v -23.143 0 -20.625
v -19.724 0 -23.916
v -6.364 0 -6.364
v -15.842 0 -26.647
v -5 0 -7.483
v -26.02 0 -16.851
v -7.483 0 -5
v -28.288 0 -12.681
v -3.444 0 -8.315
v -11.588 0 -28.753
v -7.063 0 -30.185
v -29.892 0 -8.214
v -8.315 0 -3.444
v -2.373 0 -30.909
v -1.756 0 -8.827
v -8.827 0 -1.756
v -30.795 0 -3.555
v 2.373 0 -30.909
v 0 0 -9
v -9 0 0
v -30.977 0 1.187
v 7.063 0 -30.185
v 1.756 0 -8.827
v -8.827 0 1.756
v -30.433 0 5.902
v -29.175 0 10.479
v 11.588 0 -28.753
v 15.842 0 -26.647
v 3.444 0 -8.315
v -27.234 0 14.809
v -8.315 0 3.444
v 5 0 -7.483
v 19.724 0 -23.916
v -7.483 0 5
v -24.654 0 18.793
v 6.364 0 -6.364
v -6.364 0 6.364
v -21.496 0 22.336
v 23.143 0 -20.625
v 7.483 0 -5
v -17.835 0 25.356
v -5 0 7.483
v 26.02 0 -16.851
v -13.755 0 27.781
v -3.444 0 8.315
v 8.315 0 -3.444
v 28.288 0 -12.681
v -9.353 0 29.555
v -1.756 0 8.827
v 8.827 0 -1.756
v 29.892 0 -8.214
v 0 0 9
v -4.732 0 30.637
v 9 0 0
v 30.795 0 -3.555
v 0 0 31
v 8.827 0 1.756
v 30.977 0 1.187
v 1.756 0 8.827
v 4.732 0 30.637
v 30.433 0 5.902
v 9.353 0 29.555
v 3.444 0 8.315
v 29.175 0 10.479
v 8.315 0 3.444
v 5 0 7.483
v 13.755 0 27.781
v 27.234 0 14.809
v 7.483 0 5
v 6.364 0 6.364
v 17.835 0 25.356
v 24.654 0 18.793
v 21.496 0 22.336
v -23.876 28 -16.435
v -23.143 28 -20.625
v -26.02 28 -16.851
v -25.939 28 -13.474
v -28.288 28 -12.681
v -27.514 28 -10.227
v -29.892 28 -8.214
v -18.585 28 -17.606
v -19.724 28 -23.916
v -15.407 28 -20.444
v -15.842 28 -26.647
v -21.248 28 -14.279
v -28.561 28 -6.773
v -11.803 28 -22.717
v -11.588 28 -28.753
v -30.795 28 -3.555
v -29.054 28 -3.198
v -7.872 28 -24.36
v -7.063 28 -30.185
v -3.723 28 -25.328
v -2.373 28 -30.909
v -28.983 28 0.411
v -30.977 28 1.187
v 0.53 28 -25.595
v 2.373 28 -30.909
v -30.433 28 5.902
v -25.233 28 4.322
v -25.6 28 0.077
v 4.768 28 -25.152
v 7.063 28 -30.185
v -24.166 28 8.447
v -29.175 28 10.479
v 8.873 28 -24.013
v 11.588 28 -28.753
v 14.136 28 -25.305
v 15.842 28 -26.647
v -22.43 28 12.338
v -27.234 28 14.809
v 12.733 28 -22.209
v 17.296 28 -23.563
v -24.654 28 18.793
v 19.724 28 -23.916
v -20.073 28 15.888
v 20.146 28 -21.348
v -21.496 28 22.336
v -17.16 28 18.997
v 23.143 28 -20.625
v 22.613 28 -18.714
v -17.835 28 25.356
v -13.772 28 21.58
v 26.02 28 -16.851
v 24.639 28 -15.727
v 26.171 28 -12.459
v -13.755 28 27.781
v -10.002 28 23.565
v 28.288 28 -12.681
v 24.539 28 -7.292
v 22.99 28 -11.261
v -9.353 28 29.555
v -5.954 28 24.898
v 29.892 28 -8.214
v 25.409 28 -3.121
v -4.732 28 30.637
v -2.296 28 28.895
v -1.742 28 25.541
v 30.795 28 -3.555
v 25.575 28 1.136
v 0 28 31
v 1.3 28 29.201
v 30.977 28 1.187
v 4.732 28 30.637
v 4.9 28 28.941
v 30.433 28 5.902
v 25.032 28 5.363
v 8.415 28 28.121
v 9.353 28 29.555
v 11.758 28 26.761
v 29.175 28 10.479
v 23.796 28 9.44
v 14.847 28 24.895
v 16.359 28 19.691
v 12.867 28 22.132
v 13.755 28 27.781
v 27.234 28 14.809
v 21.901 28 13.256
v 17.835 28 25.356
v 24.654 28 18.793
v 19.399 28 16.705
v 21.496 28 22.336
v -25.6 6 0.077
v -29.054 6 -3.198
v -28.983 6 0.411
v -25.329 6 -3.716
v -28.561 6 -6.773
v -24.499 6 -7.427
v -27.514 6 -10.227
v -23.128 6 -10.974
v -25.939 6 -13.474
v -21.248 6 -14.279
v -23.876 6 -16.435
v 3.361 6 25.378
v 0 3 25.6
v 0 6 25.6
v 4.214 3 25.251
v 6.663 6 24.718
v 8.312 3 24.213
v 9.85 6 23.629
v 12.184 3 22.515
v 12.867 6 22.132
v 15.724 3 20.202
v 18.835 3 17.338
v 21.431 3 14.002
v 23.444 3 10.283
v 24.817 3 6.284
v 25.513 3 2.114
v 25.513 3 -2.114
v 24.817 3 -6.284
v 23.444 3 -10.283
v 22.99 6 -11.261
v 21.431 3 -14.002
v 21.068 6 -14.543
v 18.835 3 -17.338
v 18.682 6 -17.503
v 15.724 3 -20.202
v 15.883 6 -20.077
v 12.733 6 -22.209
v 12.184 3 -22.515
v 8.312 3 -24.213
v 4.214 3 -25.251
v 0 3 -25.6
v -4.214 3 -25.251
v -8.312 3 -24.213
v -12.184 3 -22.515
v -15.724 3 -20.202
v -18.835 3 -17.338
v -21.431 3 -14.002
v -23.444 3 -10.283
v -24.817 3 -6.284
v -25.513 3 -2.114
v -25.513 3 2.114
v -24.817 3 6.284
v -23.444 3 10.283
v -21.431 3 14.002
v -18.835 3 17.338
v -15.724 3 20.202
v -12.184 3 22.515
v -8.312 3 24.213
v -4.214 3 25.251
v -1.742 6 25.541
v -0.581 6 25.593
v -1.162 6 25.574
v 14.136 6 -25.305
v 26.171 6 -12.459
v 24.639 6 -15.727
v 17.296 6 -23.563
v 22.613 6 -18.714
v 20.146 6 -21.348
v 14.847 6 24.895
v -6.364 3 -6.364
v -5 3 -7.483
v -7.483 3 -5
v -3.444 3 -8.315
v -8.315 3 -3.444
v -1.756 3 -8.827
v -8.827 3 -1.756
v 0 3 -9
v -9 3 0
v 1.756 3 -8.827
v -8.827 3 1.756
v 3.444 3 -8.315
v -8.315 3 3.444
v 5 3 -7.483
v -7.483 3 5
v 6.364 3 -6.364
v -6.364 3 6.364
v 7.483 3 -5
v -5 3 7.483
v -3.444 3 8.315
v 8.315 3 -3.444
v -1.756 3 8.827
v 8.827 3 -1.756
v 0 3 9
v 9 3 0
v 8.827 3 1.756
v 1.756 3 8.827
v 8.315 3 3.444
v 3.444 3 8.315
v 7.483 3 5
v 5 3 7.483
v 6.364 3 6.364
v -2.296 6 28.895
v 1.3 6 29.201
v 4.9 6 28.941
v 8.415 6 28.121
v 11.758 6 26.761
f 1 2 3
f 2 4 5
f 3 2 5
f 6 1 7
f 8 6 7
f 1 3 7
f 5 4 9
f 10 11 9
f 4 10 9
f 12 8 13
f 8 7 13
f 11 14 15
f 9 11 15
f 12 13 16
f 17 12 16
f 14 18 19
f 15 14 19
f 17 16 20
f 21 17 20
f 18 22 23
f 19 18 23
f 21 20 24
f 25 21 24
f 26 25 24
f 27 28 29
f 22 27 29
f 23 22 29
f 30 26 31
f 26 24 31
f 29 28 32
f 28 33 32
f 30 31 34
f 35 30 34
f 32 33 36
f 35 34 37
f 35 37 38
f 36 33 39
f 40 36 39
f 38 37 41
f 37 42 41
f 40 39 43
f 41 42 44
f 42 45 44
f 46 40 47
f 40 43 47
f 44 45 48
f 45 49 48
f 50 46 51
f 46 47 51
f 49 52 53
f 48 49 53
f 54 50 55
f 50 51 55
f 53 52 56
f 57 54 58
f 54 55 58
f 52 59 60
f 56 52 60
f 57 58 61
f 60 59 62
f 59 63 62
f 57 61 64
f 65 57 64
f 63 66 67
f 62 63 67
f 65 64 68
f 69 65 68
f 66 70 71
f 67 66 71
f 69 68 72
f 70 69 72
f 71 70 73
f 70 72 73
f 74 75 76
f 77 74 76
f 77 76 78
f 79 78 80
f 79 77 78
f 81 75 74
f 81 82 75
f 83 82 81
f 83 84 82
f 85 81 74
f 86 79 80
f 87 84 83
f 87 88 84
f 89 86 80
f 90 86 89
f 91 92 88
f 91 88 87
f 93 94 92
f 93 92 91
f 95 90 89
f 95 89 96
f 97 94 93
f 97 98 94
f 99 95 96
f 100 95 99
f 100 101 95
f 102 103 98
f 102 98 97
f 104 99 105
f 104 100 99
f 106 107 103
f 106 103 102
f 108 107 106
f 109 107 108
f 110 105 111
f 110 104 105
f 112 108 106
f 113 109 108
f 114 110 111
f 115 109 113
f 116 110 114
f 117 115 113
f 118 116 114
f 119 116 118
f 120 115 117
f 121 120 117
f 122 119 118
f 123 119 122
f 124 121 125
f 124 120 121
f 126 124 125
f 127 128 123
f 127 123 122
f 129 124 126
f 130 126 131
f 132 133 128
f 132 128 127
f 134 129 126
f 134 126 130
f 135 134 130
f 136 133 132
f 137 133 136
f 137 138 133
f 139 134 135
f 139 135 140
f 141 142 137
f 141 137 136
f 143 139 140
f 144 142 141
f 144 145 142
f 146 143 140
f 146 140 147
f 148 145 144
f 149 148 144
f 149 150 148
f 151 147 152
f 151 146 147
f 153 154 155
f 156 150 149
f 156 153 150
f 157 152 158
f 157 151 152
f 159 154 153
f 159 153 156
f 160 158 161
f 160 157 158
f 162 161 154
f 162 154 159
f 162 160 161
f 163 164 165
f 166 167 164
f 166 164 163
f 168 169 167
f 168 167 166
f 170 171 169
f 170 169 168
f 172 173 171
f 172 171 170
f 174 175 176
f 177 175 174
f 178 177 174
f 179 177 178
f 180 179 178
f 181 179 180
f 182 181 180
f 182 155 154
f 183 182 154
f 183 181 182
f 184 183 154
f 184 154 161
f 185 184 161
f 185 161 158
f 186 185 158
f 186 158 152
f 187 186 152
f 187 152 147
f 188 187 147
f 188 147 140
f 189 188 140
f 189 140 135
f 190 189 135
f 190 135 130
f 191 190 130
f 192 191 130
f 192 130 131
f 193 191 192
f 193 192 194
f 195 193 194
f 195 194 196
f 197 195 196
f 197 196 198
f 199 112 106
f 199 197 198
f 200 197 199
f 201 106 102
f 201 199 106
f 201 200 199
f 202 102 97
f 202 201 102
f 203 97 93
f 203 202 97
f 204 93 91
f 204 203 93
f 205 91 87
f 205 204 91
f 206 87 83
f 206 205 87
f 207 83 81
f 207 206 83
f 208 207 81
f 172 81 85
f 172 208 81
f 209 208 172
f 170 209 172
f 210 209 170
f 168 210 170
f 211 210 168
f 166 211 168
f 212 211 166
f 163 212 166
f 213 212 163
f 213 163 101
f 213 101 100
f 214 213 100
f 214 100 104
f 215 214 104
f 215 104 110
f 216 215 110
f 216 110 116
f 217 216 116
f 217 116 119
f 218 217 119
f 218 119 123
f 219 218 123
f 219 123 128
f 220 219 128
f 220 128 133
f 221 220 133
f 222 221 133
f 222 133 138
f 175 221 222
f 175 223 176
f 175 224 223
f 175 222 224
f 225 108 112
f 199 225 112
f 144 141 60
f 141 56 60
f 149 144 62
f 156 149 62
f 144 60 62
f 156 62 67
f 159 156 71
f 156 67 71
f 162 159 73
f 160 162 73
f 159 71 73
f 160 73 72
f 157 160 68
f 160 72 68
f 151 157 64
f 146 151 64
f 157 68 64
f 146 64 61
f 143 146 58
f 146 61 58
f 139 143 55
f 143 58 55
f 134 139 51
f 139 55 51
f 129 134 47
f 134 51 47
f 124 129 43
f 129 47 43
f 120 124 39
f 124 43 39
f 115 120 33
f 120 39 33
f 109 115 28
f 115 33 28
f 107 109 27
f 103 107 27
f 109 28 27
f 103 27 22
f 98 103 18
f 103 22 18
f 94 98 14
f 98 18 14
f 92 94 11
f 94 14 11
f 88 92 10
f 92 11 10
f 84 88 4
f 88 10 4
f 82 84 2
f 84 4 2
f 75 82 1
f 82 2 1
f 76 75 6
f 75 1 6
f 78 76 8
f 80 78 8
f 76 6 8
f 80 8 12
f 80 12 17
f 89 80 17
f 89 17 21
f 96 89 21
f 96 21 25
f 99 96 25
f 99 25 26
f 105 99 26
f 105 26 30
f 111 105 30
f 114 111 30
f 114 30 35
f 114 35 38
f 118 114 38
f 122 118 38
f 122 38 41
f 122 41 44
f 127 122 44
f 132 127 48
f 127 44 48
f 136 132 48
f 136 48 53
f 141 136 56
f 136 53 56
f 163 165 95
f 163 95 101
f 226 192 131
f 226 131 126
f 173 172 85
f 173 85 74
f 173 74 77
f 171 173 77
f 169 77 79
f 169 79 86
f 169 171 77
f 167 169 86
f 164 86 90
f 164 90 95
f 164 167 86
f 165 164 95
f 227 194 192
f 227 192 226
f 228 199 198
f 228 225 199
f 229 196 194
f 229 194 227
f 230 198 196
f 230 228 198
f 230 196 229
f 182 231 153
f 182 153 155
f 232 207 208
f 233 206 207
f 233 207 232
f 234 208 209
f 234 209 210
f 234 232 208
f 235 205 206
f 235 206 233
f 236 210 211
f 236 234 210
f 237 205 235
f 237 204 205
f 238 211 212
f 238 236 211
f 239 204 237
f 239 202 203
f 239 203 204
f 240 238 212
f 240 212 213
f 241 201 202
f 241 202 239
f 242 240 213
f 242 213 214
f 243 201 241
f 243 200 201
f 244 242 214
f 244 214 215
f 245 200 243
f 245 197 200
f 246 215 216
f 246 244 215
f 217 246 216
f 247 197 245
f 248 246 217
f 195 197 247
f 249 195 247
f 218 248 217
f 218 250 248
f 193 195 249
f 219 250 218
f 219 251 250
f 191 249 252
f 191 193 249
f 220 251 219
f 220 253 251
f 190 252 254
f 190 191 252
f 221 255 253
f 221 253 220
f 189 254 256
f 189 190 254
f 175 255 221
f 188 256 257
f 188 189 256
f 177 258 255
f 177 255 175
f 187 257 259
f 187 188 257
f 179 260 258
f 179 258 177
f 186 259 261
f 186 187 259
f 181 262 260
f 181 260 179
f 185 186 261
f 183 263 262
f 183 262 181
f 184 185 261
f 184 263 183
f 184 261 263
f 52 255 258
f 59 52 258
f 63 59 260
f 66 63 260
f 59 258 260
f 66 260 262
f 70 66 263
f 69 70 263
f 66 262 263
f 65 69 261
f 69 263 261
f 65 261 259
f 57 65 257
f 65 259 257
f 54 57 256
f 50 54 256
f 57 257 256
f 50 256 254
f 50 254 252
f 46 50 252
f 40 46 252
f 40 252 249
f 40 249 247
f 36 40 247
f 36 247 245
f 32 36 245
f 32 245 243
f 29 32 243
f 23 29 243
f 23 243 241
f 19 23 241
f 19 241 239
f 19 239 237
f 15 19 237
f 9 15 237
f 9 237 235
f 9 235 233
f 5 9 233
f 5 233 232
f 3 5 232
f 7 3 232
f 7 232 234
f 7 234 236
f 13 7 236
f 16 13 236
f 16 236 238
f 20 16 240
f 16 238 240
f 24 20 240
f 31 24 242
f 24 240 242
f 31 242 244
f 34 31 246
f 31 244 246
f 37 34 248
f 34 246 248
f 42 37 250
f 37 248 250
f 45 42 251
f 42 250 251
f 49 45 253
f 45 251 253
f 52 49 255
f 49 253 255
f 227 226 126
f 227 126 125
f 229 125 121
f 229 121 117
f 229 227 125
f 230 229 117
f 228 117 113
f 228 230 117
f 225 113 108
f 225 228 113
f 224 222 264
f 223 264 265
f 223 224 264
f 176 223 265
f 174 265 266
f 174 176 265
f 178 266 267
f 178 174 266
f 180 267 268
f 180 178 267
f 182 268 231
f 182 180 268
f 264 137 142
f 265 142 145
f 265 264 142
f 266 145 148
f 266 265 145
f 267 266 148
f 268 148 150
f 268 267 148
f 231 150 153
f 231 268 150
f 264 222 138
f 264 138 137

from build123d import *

# Parameters (mm, degrees)
SKETCH1_R           = 31
BOSS_EXTRUDE1_DEPTH = 3
SKETCH2_R           = 31
SKETCH2_R_2         = 25.6
BOSS_EXTRUDE2_DEPTH = 25
SKETCH4_R           = 9
CUT_EXTRUDE1_DEPTH  = 51.467811524
CAVITY1_START       = 6
CAVITY1_DEPTH       = 22


# Read off the part's stored shape, not the designer's step: Cavity1
with BuildPart() as part:
    # Sketch1 → Boss-Extrude1 (new body)
    with BuildSketch(Plane(origin=(0, 0, 0), x_dir=(1, 0, 0), z_dir=(0, 1, 0))):
        with Locations(Location((0, 0, 0), (0, 0, 270))):
            Circle(SKETCH1_R)
    extrude(amount=BOSS_EXTRUDE1_DEPTH)

    # Sketch2 → Boss-Extrude2 (add)
    with BuildSketch(Plane(origin=(0, 3, 0), x_dir=(1, 0, 0), z_dir=(0, 1, 0))):
        with Locations(Location((0, 0, 0), (0, 0, 270))):
            Circle(SKETCH2_R)
        with Locations(Location((0, 0, 0), (0, 0, 270))):
            Circle(SKETCH2_R_2, mode=Mode.SUBTRACT)
    extrude(amount=BOSS_EXTRUDE2_DEPTH)

    # Sketch4 → Cut-Extrude1 (cut, through all)
    with BuildSketch(Plane(origin=(0, 3, 0), x_dir=(1, 0, 0), z_dir=(0, 1, 0))):
        with Locations(Location((0, 0, 0), (0, 0, 270))):
            Circle(SKETCH4_R)
    extrude(amount=-CUT_EXTRUDE1_DEPTH, mode=Mode.SUBTRACT)

    # Cavity1 outline → Cavity1 (cut)
    with BuildSketch(Plane(origin=(0, 0, 0), x_dir=(1, 0, 0), z_dir=(0, 1, 0)).offset(CAVITY1_START)):
        with BuildLine():
            ThreePointArc((-2.295619613, -28.894863729), (6.673679903, -28.599701426), (14.847278424, -24.894604691))
            Line((14.847278424, -24.894604691), (12.866647777, -22.131637422))
            ThreePointArc((12.866647777, -22.131637422), (5.817422257, -24.930254677), (-1.742424083, -25.540633475))
            Line((-1.742424083, -25.540633475), (-2.295619613, -28.894863729))
        make_face()
        with BuildLine():
            Line((-28.982999292, -0.410817947), (-25.599884123, -0.077025125))
            ThreePointArc((-25.599884123, -0.077025125), (-24.498945002, 7.427091879), (-21.247625377, 14.279300258))
            Line((-21.247625377, 14.279300258), (-23.875876221, 16.435496767))
            ThreePointArc((-23.875876221, 16.435496767), (-28.104907927, 8.52027438), (-28.982999292, -0.410817947))
        make_face()
        with BuildLine():
            ThreePointArc((12.733236347, 22.208662547), (18.681522745, 17.503162798), (22.99004946, 11.261333217))
            Line((22.99004946, 11.261333217), (26.171495835, 12.459366962))
            ThreePointArc((26.171495835, 12.459366962), (21.431228024, 20.079427046), (14.135720867, 25.305422638))
            Line((14.135720867, 25.305422638), (12.733236347, 22.208662547))
        make_face()
    extrude(amount=CAVITY1_DEPTH, mode=Mode.SUBTRACT)


solid = part.part
